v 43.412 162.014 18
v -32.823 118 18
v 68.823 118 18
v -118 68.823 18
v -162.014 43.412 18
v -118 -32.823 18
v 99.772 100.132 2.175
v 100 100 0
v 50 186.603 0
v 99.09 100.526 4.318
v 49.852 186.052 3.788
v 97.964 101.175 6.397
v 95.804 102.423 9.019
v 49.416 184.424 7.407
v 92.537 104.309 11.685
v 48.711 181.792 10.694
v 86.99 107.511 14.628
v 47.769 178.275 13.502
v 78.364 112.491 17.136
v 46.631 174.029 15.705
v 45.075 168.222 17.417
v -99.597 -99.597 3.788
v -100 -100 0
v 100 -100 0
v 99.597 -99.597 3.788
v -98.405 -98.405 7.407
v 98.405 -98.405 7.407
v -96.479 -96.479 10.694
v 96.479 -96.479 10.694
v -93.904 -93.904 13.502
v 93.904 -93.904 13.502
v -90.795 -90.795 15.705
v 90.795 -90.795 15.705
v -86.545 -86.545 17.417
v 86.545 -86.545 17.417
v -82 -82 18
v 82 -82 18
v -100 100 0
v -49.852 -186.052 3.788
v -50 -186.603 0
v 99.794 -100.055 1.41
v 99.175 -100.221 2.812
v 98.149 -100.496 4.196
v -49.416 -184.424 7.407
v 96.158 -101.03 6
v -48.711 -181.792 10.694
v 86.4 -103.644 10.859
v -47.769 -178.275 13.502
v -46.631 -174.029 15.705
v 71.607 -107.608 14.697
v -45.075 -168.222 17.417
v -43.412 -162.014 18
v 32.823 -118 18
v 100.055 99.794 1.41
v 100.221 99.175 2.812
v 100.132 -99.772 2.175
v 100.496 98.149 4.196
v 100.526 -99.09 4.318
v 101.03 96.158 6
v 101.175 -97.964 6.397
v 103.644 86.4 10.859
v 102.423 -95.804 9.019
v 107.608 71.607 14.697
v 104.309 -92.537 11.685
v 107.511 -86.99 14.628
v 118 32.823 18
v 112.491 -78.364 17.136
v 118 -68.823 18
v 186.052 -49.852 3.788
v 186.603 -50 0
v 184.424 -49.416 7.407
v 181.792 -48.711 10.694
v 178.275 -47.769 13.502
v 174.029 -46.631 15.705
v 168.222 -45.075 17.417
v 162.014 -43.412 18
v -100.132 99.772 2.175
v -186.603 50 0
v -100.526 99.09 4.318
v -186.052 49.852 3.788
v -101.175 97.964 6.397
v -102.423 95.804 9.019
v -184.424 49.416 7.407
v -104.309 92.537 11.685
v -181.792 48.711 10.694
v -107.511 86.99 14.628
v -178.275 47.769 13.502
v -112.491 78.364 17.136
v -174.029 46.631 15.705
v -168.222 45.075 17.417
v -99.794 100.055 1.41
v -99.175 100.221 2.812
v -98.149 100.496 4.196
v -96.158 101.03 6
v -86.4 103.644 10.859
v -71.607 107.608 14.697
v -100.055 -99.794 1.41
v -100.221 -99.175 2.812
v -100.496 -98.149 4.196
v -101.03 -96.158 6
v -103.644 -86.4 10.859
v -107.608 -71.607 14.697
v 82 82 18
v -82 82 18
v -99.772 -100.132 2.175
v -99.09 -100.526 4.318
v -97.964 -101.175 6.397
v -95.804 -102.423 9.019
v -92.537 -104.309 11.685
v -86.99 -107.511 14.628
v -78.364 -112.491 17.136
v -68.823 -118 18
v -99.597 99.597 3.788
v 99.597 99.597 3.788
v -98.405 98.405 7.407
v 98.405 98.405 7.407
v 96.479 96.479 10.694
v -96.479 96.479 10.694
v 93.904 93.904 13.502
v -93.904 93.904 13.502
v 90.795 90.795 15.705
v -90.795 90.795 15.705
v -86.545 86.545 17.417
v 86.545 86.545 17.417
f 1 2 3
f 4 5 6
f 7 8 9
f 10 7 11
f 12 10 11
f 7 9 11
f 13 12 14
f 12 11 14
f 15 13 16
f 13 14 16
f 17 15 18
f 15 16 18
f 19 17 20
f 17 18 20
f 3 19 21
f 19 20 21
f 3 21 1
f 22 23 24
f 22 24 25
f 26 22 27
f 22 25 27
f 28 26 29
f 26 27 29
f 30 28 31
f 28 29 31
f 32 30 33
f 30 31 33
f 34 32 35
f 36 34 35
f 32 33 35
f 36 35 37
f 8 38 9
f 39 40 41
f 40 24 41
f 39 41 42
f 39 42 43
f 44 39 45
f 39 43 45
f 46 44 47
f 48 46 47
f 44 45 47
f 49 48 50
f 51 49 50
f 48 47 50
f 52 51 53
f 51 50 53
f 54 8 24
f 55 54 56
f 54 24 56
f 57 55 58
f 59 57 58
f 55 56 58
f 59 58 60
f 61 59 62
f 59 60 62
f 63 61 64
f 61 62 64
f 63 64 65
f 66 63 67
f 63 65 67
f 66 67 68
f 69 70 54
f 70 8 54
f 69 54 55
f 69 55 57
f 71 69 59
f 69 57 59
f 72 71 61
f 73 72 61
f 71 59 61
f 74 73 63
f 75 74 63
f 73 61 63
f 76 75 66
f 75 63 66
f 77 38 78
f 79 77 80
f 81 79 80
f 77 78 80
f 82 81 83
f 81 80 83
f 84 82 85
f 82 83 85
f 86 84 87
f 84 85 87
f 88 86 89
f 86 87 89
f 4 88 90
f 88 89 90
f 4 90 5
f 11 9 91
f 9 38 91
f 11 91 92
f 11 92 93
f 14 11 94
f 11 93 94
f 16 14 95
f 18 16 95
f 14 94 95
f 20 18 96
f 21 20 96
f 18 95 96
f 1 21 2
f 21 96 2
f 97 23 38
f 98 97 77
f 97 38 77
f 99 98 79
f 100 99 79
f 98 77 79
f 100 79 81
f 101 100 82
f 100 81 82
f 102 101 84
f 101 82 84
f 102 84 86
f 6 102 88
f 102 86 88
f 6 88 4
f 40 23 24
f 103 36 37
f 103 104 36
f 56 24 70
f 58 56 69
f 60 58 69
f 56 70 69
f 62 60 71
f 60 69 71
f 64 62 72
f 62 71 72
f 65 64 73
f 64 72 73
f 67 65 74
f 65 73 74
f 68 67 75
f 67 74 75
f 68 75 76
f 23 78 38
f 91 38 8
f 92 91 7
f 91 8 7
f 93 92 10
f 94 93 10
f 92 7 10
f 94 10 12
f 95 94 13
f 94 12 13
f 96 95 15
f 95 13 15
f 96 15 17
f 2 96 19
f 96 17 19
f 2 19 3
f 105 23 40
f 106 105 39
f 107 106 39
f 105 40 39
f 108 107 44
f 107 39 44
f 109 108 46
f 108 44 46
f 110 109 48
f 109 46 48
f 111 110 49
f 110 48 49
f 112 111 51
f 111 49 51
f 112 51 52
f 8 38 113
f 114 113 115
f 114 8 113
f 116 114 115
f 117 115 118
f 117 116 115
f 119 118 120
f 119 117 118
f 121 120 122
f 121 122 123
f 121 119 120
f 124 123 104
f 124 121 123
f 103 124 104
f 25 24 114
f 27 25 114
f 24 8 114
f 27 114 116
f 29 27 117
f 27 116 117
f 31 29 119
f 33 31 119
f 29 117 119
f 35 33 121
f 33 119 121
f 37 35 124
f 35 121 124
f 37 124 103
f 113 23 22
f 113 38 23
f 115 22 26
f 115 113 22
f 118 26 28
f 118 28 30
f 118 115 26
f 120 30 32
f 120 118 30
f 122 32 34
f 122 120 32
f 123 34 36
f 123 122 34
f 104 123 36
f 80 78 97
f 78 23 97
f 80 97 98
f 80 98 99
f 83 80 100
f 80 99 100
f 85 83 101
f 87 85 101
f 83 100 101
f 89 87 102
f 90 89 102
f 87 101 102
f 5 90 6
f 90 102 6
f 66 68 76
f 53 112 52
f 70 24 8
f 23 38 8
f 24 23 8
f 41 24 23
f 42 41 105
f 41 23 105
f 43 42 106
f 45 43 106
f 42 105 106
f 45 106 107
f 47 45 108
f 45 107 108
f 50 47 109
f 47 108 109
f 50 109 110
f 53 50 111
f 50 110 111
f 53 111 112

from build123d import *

# Parameters (mm, degrees)
F0_W     = 200
F0_H     = 200
F1_DEPTH = 18
F2_DEPTH = 18
F3_R     = 17.99999
F3_2_R   = 17.99999
F3_3_R   = 17.99999
F3_4_R   = 17.99999
F3_5_R   = 17.99999


# Not quite as in the source:
# - a fillet or chamfer is up to 0.001 mm smaller than in the source, because OpenCascade refuses the exact size


with BuildPart() as f1:
    # F0 (on Top) → F1 (new body)
    with BuildSketch(Plane.XY):
        Rectangle(F0_W, F0_H)
    extrude(amount=F1_DEPTH)

    # F3 (radius 18 in the source; OpenCascade refuses exactly that, so slightly less here)
    f3_edges = [f1.edges().sort_by_distance(p)[0] for p in [
        (0, -100, 18),
        (100, 0, 18),
        (0, 100, 18),
        (-100, 0, 18),
    ]]
    fillet(f3_edges, radius=F3_R)


with BuildPart() as f2:
    # F0 (on Top) → F2 (new body)
    with BuildSketch(Plane.XY):
        Polygon((-186.6025403784, 50), (-100, -100), (-100, 100), align=None)
    extrude(amount=F2_DEPTH)

    # F3#5 (radius 18 in the source; OpenCascade refuses exactly that, so slightly less here)
    f3_5_edges = [f2.edges().sort_by_distance(p)[0] for p in [
        (-100, 0, 18),
        (-143.30127, -25, 18),
        (-143.30127, 75, 18),
    ]]
    fillet(f3_5_edges, radius=F3_5_R)


with BuildPart() as f2b:
    # F0 (on Top) → F2, piece 2 (new body)
    with BuildSketch(Plane.XY):
        Polygon((-100, 100), (100, 100), (50, 186.6025403784), align=None)
    extrude(amount=F2_DEPTH)

    # F3#4 (radius 18 in the source; OpenCascade refuses exactly that, so slightly less here)
    f3_4_edges = [f2b.edges().sort_by_distance(p)[0] for p in [
        (0, 100, 18),
        (-25, 143.30127, 18),
        (75, 143.30127, 18),
    ]]
    fillet(f3_4_edges, radius=F3_4_R)


with BuildPart() as f2c:
    # F0 (on Top) → F2, piece 3 (new body)
    with BuildSketch(Plane.XY):
        Polygon((100, 100), (100, -100), (186.6025403784, -50), align=None)
    extrude(amount=F2_DEPTH)

    # F3#3 (radius 18 in the source; OpenCascade refuses exactly that, so slightly less here)
    f3_3_edges = [f2c.edges().sort_by_distance(p)[0] for p in [
        (100, 0, 18),
        (143.30127, 25, 18),
        (143.30127, -75, 18),
    ]]
    fillet(f3_3_edges, radius=F3_3_R)


with BuildPart() as f2d:
    # F0 (on Top) → F2, piece 4 (new body)
    with BuildSketch(Plane.XY):
        Polygon((-50, -186.6025403784), (100, -100), (-100, -100), align=None)
    extrude(amount=F2_DEPTH)

    # F3#2 (radius 18 in the source; OpenCascade refuses exactly that, so slightly less here)
    f3_2_edges = [f2d.edges().sort_by_distance(p)[0] for p in [
        (0, -100, 18),
        (25, -143.30127, 18),
        (-75, -143.30127, 18),
    ]]
    fillet(f3_2_edges, radius=F3_2_R)


solid = Compound([f1.part, f2.part, f2b.part, f2c.part, f2d.part])
